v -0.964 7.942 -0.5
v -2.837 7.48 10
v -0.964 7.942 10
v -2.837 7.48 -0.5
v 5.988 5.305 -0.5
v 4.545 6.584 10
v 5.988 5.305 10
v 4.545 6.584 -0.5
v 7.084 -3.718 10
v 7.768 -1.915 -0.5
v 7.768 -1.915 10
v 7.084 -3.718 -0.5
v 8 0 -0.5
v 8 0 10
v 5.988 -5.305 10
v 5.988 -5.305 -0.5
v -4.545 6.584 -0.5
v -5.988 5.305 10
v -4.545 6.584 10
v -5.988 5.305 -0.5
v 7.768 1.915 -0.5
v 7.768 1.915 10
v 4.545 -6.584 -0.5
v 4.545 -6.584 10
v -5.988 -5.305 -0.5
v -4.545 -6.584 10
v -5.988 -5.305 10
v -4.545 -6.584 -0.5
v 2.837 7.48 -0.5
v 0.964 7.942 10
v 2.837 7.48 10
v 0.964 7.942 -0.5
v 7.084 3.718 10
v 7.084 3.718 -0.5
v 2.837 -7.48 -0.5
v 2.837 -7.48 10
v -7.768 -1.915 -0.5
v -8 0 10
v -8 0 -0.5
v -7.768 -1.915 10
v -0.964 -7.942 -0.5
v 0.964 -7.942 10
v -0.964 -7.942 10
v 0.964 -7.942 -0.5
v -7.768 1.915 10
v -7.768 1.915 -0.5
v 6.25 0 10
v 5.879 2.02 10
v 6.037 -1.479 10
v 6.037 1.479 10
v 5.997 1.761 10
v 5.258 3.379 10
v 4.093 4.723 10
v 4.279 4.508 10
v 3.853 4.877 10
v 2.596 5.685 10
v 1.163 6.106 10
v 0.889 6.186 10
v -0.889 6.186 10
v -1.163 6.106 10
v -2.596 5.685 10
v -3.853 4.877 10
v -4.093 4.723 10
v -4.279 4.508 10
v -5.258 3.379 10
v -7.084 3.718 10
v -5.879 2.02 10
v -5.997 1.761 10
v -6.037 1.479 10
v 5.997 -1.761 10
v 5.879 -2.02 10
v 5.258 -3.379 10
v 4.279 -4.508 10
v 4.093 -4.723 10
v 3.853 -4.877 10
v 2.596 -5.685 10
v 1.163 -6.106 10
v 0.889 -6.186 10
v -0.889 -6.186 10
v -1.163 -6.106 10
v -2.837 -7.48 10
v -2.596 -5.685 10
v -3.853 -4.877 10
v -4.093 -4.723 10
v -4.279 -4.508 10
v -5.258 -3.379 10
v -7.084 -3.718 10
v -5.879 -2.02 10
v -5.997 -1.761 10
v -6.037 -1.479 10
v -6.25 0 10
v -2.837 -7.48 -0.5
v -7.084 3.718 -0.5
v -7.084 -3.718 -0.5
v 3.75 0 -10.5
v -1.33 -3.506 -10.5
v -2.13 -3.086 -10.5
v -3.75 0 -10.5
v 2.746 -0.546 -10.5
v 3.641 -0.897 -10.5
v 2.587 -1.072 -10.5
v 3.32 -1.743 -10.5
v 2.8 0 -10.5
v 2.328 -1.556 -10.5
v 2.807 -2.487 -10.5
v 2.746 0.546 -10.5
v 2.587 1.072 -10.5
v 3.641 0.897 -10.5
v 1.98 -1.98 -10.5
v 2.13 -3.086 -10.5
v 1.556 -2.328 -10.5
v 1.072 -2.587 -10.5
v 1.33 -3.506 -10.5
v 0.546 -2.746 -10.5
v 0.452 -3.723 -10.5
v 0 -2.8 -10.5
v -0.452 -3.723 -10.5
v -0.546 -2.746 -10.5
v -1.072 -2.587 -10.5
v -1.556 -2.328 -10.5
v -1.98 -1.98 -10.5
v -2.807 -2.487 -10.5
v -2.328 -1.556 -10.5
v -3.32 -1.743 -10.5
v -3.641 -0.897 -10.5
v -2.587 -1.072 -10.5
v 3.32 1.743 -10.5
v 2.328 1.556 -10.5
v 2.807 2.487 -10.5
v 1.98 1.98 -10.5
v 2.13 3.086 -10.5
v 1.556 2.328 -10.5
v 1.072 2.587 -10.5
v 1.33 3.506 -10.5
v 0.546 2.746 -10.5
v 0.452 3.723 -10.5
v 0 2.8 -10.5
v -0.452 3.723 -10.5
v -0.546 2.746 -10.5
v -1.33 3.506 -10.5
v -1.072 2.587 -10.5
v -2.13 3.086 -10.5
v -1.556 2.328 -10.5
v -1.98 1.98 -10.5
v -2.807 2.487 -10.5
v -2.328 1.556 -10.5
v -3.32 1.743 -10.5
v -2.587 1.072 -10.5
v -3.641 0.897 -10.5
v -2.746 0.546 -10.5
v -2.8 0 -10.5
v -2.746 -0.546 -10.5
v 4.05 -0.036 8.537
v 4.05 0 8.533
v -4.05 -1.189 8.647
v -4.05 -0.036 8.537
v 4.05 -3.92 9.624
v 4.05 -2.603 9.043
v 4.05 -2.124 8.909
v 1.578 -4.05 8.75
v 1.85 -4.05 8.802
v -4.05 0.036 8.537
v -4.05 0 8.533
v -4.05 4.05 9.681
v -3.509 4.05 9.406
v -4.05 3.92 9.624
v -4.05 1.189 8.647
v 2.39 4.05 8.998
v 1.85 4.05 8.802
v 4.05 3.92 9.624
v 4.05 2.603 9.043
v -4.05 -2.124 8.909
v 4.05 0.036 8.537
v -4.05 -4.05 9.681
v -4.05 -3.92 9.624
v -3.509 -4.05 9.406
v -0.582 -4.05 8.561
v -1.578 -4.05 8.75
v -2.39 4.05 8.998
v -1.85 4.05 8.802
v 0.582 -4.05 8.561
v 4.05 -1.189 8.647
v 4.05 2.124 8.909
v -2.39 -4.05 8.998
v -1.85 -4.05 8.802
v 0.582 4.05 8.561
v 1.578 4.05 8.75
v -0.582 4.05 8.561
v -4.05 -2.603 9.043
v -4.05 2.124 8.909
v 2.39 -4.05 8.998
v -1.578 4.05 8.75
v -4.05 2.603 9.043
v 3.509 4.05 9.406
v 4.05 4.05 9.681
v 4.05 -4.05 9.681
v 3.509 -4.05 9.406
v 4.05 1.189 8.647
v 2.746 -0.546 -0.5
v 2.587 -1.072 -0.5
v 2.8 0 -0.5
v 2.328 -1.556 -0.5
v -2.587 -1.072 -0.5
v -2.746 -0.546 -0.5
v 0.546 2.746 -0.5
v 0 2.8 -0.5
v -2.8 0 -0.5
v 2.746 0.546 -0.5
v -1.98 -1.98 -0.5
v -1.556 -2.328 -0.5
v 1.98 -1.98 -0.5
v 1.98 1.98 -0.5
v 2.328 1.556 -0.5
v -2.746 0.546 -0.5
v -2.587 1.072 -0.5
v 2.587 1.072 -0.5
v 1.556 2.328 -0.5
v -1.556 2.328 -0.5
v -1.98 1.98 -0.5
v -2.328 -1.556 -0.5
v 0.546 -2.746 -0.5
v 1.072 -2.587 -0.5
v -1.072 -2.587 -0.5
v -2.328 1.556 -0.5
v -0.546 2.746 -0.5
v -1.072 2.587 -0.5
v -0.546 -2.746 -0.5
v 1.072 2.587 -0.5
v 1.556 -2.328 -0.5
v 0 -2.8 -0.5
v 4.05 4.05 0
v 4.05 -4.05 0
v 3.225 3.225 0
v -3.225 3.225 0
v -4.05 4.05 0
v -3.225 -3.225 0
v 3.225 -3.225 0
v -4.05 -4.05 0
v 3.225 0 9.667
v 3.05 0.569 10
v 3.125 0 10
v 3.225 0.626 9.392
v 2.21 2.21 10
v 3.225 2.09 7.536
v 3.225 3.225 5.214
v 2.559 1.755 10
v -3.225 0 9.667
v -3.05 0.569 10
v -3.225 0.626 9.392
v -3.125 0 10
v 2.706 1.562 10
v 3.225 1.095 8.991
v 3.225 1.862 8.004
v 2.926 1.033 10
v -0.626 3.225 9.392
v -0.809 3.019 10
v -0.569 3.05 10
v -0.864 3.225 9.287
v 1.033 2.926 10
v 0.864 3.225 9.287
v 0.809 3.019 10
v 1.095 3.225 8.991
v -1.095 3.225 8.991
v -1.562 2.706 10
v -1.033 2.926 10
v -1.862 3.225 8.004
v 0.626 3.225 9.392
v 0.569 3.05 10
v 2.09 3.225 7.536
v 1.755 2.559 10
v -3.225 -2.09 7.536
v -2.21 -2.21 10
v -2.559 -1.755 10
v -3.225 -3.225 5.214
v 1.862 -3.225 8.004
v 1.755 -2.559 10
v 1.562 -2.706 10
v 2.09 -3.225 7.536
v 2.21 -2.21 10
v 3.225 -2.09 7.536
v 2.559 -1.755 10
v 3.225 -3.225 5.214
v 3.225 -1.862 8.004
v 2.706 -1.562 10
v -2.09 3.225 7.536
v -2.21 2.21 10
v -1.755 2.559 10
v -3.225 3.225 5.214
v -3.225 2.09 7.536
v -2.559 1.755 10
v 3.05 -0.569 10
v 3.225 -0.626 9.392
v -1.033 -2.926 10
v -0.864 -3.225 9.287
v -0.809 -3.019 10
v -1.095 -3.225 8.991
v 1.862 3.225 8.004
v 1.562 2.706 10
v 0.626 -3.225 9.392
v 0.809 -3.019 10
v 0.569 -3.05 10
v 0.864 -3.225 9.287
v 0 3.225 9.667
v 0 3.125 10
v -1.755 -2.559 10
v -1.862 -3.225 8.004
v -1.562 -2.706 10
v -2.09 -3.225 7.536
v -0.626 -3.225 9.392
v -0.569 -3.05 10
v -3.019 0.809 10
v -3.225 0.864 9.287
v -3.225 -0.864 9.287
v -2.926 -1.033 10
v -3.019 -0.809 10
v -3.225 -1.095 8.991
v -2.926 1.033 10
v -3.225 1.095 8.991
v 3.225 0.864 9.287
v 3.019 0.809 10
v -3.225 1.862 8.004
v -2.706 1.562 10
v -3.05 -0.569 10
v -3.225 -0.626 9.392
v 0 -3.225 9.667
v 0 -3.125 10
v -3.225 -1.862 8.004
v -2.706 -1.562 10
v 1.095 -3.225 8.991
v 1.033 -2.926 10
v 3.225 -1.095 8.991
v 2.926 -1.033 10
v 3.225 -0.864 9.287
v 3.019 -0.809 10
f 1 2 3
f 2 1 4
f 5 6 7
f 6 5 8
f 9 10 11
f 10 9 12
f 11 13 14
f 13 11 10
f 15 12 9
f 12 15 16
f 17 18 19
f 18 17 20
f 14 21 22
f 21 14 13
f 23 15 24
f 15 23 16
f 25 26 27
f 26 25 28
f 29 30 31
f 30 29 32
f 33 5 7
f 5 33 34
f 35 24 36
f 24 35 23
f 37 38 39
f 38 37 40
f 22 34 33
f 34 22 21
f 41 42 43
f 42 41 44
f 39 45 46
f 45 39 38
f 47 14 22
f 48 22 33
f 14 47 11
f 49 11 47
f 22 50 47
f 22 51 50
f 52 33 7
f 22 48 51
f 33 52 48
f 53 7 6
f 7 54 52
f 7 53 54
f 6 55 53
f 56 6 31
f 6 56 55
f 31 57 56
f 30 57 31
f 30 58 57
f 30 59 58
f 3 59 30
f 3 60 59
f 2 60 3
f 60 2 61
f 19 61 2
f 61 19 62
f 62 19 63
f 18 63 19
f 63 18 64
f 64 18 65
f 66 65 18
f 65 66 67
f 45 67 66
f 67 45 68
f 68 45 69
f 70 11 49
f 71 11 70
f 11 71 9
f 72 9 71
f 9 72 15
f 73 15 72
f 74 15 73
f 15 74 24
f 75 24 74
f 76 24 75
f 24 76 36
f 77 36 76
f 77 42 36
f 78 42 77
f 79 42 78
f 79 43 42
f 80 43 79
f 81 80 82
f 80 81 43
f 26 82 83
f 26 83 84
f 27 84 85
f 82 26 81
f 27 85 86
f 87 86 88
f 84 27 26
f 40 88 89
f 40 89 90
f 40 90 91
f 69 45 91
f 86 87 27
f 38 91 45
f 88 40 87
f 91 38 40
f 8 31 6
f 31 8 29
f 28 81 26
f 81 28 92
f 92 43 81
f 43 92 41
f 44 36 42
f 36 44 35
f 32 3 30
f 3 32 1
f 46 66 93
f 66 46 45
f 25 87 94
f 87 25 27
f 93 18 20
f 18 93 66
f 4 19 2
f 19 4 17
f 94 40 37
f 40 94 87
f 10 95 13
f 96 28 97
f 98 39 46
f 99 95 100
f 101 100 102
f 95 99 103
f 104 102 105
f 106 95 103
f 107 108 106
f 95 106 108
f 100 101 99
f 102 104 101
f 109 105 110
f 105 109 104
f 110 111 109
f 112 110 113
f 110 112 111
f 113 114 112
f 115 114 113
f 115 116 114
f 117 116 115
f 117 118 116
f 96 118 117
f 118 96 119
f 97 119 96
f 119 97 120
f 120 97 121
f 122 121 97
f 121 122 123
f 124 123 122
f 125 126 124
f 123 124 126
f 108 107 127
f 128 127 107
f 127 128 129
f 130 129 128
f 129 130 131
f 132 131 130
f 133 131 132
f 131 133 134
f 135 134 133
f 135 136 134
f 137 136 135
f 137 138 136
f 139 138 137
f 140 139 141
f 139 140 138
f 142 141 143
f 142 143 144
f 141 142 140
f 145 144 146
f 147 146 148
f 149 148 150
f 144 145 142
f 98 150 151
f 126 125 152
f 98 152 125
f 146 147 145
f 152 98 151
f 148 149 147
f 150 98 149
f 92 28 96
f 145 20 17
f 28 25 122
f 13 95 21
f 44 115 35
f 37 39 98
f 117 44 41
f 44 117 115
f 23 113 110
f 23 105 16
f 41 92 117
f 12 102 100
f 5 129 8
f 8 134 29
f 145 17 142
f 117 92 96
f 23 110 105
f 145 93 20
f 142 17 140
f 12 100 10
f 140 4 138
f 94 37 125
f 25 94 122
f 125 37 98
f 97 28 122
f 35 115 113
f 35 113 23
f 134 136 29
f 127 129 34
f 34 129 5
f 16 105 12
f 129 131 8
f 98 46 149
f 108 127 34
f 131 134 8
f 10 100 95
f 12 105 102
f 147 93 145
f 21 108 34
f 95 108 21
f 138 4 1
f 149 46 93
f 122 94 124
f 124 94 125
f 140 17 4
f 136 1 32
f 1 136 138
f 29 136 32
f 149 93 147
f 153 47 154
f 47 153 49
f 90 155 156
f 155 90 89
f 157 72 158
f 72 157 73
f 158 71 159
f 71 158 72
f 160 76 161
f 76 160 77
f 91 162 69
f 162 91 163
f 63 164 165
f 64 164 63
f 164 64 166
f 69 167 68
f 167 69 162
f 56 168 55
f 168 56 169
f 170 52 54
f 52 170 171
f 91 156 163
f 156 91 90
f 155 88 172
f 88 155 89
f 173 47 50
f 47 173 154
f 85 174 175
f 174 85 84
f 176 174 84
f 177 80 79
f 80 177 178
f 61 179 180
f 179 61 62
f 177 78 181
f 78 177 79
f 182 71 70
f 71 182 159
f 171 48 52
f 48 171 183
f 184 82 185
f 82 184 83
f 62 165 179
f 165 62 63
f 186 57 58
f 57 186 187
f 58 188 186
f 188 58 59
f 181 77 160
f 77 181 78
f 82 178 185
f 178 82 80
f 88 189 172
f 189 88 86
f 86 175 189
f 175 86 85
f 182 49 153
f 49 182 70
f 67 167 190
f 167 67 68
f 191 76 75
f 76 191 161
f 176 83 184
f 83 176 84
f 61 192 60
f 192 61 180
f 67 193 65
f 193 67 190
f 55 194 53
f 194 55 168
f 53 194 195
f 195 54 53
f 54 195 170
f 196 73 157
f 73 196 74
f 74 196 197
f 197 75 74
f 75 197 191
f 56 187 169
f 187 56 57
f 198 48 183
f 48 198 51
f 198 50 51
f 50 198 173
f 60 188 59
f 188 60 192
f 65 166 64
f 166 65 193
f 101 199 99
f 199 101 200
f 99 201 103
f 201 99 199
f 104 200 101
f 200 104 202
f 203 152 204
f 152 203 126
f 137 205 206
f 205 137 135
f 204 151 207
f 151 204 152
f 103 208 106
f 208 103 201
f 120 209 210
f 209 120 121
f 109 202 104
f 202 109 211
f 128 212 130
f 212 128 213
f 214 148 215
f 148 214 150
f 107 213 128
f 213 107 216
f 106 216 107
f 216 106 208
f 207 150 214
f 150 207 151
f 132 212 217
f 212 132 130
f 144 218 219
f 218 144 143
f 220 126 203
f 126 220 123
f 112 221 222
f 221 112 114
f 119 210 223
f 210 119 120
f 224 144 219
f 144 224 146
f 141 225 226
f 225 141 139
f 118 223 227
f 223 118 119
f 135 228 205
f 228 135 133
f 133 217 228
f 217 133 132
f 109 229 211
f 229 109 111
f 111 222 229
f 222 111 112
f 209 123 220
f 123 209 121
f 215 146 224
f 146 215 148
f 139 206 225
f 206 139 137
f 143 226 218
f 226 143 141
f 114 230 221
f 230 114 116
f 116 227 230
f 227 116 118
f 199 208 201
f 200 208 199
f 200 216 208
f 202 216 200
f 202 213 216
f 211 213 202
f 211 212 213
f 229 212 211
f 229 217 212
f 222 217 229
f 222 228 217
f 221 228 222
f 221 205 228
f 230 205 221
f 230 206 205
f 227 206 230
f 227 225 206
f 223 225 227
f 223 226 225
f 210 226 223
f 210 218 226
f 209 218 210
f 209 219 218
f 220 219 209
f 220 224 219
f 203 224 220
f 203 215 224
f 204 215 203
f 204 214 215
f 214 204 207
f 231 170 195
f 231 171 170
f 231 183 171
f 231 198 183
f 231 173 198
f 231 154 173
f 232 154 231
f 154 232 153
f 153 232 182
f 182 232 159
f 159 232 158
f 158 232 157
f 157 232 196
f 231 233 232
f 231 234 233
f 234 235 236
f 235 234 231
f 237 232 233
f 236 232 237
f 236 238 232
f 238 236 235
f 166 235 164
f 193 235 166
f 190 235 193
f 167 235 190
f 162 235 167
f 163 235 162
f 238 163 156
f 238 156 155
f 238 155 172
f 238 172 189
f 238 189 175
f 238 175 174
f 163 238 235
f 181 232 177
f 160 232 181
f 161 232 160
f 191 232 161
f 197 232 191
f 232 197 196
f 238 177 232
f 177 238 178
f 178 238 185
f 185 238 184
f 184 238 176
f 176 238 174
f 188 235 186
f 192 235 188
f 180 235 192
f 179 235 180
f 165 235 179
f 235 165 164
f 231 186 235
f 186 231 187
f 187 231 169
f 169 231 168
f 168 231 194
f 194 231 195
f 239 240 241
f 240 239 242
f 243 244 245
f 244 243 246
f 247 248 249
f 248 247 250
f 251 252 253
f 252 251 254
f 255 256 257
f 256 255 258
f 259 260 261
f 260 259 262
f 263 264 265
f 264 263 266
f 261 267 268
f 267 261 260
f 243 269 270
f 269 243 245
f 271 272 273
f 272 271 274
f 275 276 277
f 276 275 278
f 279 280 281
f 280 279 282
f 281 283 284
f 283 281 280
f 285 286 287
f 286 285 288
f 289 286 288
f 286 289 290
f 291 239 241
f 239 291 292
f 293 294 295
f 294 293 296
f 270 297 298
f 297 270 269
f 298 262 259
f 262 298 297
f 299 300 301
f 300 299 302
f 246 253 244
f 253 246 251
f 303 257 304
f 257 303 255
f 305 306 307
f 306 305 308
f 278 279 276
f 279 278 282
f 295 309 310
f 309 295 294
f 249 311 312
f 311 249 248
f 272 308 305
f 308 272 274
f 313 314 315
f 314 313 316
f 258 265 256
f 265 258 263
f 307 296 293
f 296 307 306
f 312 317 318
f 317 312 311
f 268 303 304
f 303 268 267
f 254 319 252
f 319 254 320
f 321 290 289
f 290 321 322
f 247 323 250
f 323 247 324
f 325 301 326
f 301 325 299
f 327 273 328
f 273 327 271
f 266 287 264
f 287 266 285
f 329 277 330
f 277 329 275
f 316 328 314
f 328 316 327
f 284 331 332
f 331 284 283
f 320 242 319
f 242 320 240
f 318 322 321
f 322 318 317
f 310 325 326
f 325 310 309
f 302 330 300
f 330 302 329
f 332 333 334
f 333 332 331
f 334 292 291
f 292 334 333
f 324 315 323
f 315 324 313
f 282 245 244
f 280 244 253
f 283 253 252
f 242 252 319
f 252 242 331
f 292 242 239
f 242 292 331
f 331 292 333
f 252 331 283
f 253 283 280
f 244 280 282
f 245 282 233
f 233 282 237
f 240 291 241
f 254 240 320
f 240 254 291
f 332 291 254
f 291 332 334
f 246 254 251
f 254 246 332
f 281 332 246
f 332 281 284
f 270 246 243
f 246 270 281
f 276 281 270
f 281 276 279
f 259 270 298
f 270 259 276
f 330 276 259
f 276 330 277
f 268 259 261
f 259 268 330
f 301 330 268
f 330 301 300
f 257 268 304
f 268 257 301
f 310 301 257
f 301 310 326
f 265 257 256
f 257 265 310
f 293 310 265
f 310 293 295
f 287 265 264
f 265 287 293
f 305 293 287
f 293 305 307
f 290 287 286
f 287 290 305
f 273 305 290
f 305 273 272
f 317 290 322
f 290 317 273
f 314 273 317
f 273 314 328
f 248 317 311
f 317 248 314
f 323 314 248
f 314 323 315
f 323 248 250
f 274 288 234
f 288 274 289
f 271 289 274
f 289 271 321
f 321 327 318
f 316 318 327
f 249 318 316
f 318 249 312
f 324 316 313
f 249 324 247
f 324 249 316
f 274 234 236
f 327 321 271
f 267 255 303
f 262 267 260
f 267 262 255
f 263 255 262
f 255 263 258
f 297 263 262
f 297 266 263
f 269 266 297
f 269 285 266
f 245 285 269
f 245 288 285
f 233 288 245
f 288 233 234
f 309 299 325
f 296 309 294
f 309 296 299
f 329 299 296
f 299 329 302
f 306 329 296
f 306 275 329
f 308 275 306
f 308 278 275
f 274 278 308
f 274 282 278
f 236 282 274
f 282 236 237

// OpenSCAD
dia= 16; // coupling diameter
od=8; // squre rod o/d
id=6.65; // square rod i/d
l= 20; // length of coupling
td= 5.5; // traxxas o/d
clearance= 0.1;
clearance2= 0.2;
clearance1= 0.05;

// a mouth to make it easier to insert the square tubing, basically chamfering the opening
module mouth() {
	difference() {
		cylinder(r1=od/2+3,r2=od/2, h=2);
		cube([id,id,l/2], center=true);		
	}
}

// chamfer the square insert
module chamfer_top() {
	intersection() {
		translate([0,0,-l/2+1]) cylinder(r1=id/2+4,r2=id/2-2, h=l);
		cube([id-clearance2,id-clearance2,l/2], center=true);
	}
}

module rod_acceptor() {
	translate([0,0,-l/4]) cube([od+clearance,od+clearance,l/2], center=true);
}

module coupler() {
   union() {
		difference() {
			union() {
				translate([0,0,-l/2]) cylinder(r=dia/2,h=l/2);
				// fill in layer halfway
				translate([0,0,-1/2]) cylinder(r=dia/2, h=1);
				// taper down to avoid interference with edge of effector
				translate([0,0,1/2]) cylinder(r1=dia/2,r2=td/2+1,h=l/2);
			}
			#translate([0,0,1/2]) cylinder(r= td/2+clearance1, h= l/2, $fn=32);
			rod_acceptor();
			translate([0,0,-l/2-0.5]) mouth();
		}

		// the chamfered plug
		translate([0,0,-l/4]) rotate([180,0,0]) chamfer_top();
	}
}

// print upside down with square at top makes it easier to insert square
rotate([180,0,0]) coupler();

//rod_acceptor();

//mouth();
//chamfer_top();
